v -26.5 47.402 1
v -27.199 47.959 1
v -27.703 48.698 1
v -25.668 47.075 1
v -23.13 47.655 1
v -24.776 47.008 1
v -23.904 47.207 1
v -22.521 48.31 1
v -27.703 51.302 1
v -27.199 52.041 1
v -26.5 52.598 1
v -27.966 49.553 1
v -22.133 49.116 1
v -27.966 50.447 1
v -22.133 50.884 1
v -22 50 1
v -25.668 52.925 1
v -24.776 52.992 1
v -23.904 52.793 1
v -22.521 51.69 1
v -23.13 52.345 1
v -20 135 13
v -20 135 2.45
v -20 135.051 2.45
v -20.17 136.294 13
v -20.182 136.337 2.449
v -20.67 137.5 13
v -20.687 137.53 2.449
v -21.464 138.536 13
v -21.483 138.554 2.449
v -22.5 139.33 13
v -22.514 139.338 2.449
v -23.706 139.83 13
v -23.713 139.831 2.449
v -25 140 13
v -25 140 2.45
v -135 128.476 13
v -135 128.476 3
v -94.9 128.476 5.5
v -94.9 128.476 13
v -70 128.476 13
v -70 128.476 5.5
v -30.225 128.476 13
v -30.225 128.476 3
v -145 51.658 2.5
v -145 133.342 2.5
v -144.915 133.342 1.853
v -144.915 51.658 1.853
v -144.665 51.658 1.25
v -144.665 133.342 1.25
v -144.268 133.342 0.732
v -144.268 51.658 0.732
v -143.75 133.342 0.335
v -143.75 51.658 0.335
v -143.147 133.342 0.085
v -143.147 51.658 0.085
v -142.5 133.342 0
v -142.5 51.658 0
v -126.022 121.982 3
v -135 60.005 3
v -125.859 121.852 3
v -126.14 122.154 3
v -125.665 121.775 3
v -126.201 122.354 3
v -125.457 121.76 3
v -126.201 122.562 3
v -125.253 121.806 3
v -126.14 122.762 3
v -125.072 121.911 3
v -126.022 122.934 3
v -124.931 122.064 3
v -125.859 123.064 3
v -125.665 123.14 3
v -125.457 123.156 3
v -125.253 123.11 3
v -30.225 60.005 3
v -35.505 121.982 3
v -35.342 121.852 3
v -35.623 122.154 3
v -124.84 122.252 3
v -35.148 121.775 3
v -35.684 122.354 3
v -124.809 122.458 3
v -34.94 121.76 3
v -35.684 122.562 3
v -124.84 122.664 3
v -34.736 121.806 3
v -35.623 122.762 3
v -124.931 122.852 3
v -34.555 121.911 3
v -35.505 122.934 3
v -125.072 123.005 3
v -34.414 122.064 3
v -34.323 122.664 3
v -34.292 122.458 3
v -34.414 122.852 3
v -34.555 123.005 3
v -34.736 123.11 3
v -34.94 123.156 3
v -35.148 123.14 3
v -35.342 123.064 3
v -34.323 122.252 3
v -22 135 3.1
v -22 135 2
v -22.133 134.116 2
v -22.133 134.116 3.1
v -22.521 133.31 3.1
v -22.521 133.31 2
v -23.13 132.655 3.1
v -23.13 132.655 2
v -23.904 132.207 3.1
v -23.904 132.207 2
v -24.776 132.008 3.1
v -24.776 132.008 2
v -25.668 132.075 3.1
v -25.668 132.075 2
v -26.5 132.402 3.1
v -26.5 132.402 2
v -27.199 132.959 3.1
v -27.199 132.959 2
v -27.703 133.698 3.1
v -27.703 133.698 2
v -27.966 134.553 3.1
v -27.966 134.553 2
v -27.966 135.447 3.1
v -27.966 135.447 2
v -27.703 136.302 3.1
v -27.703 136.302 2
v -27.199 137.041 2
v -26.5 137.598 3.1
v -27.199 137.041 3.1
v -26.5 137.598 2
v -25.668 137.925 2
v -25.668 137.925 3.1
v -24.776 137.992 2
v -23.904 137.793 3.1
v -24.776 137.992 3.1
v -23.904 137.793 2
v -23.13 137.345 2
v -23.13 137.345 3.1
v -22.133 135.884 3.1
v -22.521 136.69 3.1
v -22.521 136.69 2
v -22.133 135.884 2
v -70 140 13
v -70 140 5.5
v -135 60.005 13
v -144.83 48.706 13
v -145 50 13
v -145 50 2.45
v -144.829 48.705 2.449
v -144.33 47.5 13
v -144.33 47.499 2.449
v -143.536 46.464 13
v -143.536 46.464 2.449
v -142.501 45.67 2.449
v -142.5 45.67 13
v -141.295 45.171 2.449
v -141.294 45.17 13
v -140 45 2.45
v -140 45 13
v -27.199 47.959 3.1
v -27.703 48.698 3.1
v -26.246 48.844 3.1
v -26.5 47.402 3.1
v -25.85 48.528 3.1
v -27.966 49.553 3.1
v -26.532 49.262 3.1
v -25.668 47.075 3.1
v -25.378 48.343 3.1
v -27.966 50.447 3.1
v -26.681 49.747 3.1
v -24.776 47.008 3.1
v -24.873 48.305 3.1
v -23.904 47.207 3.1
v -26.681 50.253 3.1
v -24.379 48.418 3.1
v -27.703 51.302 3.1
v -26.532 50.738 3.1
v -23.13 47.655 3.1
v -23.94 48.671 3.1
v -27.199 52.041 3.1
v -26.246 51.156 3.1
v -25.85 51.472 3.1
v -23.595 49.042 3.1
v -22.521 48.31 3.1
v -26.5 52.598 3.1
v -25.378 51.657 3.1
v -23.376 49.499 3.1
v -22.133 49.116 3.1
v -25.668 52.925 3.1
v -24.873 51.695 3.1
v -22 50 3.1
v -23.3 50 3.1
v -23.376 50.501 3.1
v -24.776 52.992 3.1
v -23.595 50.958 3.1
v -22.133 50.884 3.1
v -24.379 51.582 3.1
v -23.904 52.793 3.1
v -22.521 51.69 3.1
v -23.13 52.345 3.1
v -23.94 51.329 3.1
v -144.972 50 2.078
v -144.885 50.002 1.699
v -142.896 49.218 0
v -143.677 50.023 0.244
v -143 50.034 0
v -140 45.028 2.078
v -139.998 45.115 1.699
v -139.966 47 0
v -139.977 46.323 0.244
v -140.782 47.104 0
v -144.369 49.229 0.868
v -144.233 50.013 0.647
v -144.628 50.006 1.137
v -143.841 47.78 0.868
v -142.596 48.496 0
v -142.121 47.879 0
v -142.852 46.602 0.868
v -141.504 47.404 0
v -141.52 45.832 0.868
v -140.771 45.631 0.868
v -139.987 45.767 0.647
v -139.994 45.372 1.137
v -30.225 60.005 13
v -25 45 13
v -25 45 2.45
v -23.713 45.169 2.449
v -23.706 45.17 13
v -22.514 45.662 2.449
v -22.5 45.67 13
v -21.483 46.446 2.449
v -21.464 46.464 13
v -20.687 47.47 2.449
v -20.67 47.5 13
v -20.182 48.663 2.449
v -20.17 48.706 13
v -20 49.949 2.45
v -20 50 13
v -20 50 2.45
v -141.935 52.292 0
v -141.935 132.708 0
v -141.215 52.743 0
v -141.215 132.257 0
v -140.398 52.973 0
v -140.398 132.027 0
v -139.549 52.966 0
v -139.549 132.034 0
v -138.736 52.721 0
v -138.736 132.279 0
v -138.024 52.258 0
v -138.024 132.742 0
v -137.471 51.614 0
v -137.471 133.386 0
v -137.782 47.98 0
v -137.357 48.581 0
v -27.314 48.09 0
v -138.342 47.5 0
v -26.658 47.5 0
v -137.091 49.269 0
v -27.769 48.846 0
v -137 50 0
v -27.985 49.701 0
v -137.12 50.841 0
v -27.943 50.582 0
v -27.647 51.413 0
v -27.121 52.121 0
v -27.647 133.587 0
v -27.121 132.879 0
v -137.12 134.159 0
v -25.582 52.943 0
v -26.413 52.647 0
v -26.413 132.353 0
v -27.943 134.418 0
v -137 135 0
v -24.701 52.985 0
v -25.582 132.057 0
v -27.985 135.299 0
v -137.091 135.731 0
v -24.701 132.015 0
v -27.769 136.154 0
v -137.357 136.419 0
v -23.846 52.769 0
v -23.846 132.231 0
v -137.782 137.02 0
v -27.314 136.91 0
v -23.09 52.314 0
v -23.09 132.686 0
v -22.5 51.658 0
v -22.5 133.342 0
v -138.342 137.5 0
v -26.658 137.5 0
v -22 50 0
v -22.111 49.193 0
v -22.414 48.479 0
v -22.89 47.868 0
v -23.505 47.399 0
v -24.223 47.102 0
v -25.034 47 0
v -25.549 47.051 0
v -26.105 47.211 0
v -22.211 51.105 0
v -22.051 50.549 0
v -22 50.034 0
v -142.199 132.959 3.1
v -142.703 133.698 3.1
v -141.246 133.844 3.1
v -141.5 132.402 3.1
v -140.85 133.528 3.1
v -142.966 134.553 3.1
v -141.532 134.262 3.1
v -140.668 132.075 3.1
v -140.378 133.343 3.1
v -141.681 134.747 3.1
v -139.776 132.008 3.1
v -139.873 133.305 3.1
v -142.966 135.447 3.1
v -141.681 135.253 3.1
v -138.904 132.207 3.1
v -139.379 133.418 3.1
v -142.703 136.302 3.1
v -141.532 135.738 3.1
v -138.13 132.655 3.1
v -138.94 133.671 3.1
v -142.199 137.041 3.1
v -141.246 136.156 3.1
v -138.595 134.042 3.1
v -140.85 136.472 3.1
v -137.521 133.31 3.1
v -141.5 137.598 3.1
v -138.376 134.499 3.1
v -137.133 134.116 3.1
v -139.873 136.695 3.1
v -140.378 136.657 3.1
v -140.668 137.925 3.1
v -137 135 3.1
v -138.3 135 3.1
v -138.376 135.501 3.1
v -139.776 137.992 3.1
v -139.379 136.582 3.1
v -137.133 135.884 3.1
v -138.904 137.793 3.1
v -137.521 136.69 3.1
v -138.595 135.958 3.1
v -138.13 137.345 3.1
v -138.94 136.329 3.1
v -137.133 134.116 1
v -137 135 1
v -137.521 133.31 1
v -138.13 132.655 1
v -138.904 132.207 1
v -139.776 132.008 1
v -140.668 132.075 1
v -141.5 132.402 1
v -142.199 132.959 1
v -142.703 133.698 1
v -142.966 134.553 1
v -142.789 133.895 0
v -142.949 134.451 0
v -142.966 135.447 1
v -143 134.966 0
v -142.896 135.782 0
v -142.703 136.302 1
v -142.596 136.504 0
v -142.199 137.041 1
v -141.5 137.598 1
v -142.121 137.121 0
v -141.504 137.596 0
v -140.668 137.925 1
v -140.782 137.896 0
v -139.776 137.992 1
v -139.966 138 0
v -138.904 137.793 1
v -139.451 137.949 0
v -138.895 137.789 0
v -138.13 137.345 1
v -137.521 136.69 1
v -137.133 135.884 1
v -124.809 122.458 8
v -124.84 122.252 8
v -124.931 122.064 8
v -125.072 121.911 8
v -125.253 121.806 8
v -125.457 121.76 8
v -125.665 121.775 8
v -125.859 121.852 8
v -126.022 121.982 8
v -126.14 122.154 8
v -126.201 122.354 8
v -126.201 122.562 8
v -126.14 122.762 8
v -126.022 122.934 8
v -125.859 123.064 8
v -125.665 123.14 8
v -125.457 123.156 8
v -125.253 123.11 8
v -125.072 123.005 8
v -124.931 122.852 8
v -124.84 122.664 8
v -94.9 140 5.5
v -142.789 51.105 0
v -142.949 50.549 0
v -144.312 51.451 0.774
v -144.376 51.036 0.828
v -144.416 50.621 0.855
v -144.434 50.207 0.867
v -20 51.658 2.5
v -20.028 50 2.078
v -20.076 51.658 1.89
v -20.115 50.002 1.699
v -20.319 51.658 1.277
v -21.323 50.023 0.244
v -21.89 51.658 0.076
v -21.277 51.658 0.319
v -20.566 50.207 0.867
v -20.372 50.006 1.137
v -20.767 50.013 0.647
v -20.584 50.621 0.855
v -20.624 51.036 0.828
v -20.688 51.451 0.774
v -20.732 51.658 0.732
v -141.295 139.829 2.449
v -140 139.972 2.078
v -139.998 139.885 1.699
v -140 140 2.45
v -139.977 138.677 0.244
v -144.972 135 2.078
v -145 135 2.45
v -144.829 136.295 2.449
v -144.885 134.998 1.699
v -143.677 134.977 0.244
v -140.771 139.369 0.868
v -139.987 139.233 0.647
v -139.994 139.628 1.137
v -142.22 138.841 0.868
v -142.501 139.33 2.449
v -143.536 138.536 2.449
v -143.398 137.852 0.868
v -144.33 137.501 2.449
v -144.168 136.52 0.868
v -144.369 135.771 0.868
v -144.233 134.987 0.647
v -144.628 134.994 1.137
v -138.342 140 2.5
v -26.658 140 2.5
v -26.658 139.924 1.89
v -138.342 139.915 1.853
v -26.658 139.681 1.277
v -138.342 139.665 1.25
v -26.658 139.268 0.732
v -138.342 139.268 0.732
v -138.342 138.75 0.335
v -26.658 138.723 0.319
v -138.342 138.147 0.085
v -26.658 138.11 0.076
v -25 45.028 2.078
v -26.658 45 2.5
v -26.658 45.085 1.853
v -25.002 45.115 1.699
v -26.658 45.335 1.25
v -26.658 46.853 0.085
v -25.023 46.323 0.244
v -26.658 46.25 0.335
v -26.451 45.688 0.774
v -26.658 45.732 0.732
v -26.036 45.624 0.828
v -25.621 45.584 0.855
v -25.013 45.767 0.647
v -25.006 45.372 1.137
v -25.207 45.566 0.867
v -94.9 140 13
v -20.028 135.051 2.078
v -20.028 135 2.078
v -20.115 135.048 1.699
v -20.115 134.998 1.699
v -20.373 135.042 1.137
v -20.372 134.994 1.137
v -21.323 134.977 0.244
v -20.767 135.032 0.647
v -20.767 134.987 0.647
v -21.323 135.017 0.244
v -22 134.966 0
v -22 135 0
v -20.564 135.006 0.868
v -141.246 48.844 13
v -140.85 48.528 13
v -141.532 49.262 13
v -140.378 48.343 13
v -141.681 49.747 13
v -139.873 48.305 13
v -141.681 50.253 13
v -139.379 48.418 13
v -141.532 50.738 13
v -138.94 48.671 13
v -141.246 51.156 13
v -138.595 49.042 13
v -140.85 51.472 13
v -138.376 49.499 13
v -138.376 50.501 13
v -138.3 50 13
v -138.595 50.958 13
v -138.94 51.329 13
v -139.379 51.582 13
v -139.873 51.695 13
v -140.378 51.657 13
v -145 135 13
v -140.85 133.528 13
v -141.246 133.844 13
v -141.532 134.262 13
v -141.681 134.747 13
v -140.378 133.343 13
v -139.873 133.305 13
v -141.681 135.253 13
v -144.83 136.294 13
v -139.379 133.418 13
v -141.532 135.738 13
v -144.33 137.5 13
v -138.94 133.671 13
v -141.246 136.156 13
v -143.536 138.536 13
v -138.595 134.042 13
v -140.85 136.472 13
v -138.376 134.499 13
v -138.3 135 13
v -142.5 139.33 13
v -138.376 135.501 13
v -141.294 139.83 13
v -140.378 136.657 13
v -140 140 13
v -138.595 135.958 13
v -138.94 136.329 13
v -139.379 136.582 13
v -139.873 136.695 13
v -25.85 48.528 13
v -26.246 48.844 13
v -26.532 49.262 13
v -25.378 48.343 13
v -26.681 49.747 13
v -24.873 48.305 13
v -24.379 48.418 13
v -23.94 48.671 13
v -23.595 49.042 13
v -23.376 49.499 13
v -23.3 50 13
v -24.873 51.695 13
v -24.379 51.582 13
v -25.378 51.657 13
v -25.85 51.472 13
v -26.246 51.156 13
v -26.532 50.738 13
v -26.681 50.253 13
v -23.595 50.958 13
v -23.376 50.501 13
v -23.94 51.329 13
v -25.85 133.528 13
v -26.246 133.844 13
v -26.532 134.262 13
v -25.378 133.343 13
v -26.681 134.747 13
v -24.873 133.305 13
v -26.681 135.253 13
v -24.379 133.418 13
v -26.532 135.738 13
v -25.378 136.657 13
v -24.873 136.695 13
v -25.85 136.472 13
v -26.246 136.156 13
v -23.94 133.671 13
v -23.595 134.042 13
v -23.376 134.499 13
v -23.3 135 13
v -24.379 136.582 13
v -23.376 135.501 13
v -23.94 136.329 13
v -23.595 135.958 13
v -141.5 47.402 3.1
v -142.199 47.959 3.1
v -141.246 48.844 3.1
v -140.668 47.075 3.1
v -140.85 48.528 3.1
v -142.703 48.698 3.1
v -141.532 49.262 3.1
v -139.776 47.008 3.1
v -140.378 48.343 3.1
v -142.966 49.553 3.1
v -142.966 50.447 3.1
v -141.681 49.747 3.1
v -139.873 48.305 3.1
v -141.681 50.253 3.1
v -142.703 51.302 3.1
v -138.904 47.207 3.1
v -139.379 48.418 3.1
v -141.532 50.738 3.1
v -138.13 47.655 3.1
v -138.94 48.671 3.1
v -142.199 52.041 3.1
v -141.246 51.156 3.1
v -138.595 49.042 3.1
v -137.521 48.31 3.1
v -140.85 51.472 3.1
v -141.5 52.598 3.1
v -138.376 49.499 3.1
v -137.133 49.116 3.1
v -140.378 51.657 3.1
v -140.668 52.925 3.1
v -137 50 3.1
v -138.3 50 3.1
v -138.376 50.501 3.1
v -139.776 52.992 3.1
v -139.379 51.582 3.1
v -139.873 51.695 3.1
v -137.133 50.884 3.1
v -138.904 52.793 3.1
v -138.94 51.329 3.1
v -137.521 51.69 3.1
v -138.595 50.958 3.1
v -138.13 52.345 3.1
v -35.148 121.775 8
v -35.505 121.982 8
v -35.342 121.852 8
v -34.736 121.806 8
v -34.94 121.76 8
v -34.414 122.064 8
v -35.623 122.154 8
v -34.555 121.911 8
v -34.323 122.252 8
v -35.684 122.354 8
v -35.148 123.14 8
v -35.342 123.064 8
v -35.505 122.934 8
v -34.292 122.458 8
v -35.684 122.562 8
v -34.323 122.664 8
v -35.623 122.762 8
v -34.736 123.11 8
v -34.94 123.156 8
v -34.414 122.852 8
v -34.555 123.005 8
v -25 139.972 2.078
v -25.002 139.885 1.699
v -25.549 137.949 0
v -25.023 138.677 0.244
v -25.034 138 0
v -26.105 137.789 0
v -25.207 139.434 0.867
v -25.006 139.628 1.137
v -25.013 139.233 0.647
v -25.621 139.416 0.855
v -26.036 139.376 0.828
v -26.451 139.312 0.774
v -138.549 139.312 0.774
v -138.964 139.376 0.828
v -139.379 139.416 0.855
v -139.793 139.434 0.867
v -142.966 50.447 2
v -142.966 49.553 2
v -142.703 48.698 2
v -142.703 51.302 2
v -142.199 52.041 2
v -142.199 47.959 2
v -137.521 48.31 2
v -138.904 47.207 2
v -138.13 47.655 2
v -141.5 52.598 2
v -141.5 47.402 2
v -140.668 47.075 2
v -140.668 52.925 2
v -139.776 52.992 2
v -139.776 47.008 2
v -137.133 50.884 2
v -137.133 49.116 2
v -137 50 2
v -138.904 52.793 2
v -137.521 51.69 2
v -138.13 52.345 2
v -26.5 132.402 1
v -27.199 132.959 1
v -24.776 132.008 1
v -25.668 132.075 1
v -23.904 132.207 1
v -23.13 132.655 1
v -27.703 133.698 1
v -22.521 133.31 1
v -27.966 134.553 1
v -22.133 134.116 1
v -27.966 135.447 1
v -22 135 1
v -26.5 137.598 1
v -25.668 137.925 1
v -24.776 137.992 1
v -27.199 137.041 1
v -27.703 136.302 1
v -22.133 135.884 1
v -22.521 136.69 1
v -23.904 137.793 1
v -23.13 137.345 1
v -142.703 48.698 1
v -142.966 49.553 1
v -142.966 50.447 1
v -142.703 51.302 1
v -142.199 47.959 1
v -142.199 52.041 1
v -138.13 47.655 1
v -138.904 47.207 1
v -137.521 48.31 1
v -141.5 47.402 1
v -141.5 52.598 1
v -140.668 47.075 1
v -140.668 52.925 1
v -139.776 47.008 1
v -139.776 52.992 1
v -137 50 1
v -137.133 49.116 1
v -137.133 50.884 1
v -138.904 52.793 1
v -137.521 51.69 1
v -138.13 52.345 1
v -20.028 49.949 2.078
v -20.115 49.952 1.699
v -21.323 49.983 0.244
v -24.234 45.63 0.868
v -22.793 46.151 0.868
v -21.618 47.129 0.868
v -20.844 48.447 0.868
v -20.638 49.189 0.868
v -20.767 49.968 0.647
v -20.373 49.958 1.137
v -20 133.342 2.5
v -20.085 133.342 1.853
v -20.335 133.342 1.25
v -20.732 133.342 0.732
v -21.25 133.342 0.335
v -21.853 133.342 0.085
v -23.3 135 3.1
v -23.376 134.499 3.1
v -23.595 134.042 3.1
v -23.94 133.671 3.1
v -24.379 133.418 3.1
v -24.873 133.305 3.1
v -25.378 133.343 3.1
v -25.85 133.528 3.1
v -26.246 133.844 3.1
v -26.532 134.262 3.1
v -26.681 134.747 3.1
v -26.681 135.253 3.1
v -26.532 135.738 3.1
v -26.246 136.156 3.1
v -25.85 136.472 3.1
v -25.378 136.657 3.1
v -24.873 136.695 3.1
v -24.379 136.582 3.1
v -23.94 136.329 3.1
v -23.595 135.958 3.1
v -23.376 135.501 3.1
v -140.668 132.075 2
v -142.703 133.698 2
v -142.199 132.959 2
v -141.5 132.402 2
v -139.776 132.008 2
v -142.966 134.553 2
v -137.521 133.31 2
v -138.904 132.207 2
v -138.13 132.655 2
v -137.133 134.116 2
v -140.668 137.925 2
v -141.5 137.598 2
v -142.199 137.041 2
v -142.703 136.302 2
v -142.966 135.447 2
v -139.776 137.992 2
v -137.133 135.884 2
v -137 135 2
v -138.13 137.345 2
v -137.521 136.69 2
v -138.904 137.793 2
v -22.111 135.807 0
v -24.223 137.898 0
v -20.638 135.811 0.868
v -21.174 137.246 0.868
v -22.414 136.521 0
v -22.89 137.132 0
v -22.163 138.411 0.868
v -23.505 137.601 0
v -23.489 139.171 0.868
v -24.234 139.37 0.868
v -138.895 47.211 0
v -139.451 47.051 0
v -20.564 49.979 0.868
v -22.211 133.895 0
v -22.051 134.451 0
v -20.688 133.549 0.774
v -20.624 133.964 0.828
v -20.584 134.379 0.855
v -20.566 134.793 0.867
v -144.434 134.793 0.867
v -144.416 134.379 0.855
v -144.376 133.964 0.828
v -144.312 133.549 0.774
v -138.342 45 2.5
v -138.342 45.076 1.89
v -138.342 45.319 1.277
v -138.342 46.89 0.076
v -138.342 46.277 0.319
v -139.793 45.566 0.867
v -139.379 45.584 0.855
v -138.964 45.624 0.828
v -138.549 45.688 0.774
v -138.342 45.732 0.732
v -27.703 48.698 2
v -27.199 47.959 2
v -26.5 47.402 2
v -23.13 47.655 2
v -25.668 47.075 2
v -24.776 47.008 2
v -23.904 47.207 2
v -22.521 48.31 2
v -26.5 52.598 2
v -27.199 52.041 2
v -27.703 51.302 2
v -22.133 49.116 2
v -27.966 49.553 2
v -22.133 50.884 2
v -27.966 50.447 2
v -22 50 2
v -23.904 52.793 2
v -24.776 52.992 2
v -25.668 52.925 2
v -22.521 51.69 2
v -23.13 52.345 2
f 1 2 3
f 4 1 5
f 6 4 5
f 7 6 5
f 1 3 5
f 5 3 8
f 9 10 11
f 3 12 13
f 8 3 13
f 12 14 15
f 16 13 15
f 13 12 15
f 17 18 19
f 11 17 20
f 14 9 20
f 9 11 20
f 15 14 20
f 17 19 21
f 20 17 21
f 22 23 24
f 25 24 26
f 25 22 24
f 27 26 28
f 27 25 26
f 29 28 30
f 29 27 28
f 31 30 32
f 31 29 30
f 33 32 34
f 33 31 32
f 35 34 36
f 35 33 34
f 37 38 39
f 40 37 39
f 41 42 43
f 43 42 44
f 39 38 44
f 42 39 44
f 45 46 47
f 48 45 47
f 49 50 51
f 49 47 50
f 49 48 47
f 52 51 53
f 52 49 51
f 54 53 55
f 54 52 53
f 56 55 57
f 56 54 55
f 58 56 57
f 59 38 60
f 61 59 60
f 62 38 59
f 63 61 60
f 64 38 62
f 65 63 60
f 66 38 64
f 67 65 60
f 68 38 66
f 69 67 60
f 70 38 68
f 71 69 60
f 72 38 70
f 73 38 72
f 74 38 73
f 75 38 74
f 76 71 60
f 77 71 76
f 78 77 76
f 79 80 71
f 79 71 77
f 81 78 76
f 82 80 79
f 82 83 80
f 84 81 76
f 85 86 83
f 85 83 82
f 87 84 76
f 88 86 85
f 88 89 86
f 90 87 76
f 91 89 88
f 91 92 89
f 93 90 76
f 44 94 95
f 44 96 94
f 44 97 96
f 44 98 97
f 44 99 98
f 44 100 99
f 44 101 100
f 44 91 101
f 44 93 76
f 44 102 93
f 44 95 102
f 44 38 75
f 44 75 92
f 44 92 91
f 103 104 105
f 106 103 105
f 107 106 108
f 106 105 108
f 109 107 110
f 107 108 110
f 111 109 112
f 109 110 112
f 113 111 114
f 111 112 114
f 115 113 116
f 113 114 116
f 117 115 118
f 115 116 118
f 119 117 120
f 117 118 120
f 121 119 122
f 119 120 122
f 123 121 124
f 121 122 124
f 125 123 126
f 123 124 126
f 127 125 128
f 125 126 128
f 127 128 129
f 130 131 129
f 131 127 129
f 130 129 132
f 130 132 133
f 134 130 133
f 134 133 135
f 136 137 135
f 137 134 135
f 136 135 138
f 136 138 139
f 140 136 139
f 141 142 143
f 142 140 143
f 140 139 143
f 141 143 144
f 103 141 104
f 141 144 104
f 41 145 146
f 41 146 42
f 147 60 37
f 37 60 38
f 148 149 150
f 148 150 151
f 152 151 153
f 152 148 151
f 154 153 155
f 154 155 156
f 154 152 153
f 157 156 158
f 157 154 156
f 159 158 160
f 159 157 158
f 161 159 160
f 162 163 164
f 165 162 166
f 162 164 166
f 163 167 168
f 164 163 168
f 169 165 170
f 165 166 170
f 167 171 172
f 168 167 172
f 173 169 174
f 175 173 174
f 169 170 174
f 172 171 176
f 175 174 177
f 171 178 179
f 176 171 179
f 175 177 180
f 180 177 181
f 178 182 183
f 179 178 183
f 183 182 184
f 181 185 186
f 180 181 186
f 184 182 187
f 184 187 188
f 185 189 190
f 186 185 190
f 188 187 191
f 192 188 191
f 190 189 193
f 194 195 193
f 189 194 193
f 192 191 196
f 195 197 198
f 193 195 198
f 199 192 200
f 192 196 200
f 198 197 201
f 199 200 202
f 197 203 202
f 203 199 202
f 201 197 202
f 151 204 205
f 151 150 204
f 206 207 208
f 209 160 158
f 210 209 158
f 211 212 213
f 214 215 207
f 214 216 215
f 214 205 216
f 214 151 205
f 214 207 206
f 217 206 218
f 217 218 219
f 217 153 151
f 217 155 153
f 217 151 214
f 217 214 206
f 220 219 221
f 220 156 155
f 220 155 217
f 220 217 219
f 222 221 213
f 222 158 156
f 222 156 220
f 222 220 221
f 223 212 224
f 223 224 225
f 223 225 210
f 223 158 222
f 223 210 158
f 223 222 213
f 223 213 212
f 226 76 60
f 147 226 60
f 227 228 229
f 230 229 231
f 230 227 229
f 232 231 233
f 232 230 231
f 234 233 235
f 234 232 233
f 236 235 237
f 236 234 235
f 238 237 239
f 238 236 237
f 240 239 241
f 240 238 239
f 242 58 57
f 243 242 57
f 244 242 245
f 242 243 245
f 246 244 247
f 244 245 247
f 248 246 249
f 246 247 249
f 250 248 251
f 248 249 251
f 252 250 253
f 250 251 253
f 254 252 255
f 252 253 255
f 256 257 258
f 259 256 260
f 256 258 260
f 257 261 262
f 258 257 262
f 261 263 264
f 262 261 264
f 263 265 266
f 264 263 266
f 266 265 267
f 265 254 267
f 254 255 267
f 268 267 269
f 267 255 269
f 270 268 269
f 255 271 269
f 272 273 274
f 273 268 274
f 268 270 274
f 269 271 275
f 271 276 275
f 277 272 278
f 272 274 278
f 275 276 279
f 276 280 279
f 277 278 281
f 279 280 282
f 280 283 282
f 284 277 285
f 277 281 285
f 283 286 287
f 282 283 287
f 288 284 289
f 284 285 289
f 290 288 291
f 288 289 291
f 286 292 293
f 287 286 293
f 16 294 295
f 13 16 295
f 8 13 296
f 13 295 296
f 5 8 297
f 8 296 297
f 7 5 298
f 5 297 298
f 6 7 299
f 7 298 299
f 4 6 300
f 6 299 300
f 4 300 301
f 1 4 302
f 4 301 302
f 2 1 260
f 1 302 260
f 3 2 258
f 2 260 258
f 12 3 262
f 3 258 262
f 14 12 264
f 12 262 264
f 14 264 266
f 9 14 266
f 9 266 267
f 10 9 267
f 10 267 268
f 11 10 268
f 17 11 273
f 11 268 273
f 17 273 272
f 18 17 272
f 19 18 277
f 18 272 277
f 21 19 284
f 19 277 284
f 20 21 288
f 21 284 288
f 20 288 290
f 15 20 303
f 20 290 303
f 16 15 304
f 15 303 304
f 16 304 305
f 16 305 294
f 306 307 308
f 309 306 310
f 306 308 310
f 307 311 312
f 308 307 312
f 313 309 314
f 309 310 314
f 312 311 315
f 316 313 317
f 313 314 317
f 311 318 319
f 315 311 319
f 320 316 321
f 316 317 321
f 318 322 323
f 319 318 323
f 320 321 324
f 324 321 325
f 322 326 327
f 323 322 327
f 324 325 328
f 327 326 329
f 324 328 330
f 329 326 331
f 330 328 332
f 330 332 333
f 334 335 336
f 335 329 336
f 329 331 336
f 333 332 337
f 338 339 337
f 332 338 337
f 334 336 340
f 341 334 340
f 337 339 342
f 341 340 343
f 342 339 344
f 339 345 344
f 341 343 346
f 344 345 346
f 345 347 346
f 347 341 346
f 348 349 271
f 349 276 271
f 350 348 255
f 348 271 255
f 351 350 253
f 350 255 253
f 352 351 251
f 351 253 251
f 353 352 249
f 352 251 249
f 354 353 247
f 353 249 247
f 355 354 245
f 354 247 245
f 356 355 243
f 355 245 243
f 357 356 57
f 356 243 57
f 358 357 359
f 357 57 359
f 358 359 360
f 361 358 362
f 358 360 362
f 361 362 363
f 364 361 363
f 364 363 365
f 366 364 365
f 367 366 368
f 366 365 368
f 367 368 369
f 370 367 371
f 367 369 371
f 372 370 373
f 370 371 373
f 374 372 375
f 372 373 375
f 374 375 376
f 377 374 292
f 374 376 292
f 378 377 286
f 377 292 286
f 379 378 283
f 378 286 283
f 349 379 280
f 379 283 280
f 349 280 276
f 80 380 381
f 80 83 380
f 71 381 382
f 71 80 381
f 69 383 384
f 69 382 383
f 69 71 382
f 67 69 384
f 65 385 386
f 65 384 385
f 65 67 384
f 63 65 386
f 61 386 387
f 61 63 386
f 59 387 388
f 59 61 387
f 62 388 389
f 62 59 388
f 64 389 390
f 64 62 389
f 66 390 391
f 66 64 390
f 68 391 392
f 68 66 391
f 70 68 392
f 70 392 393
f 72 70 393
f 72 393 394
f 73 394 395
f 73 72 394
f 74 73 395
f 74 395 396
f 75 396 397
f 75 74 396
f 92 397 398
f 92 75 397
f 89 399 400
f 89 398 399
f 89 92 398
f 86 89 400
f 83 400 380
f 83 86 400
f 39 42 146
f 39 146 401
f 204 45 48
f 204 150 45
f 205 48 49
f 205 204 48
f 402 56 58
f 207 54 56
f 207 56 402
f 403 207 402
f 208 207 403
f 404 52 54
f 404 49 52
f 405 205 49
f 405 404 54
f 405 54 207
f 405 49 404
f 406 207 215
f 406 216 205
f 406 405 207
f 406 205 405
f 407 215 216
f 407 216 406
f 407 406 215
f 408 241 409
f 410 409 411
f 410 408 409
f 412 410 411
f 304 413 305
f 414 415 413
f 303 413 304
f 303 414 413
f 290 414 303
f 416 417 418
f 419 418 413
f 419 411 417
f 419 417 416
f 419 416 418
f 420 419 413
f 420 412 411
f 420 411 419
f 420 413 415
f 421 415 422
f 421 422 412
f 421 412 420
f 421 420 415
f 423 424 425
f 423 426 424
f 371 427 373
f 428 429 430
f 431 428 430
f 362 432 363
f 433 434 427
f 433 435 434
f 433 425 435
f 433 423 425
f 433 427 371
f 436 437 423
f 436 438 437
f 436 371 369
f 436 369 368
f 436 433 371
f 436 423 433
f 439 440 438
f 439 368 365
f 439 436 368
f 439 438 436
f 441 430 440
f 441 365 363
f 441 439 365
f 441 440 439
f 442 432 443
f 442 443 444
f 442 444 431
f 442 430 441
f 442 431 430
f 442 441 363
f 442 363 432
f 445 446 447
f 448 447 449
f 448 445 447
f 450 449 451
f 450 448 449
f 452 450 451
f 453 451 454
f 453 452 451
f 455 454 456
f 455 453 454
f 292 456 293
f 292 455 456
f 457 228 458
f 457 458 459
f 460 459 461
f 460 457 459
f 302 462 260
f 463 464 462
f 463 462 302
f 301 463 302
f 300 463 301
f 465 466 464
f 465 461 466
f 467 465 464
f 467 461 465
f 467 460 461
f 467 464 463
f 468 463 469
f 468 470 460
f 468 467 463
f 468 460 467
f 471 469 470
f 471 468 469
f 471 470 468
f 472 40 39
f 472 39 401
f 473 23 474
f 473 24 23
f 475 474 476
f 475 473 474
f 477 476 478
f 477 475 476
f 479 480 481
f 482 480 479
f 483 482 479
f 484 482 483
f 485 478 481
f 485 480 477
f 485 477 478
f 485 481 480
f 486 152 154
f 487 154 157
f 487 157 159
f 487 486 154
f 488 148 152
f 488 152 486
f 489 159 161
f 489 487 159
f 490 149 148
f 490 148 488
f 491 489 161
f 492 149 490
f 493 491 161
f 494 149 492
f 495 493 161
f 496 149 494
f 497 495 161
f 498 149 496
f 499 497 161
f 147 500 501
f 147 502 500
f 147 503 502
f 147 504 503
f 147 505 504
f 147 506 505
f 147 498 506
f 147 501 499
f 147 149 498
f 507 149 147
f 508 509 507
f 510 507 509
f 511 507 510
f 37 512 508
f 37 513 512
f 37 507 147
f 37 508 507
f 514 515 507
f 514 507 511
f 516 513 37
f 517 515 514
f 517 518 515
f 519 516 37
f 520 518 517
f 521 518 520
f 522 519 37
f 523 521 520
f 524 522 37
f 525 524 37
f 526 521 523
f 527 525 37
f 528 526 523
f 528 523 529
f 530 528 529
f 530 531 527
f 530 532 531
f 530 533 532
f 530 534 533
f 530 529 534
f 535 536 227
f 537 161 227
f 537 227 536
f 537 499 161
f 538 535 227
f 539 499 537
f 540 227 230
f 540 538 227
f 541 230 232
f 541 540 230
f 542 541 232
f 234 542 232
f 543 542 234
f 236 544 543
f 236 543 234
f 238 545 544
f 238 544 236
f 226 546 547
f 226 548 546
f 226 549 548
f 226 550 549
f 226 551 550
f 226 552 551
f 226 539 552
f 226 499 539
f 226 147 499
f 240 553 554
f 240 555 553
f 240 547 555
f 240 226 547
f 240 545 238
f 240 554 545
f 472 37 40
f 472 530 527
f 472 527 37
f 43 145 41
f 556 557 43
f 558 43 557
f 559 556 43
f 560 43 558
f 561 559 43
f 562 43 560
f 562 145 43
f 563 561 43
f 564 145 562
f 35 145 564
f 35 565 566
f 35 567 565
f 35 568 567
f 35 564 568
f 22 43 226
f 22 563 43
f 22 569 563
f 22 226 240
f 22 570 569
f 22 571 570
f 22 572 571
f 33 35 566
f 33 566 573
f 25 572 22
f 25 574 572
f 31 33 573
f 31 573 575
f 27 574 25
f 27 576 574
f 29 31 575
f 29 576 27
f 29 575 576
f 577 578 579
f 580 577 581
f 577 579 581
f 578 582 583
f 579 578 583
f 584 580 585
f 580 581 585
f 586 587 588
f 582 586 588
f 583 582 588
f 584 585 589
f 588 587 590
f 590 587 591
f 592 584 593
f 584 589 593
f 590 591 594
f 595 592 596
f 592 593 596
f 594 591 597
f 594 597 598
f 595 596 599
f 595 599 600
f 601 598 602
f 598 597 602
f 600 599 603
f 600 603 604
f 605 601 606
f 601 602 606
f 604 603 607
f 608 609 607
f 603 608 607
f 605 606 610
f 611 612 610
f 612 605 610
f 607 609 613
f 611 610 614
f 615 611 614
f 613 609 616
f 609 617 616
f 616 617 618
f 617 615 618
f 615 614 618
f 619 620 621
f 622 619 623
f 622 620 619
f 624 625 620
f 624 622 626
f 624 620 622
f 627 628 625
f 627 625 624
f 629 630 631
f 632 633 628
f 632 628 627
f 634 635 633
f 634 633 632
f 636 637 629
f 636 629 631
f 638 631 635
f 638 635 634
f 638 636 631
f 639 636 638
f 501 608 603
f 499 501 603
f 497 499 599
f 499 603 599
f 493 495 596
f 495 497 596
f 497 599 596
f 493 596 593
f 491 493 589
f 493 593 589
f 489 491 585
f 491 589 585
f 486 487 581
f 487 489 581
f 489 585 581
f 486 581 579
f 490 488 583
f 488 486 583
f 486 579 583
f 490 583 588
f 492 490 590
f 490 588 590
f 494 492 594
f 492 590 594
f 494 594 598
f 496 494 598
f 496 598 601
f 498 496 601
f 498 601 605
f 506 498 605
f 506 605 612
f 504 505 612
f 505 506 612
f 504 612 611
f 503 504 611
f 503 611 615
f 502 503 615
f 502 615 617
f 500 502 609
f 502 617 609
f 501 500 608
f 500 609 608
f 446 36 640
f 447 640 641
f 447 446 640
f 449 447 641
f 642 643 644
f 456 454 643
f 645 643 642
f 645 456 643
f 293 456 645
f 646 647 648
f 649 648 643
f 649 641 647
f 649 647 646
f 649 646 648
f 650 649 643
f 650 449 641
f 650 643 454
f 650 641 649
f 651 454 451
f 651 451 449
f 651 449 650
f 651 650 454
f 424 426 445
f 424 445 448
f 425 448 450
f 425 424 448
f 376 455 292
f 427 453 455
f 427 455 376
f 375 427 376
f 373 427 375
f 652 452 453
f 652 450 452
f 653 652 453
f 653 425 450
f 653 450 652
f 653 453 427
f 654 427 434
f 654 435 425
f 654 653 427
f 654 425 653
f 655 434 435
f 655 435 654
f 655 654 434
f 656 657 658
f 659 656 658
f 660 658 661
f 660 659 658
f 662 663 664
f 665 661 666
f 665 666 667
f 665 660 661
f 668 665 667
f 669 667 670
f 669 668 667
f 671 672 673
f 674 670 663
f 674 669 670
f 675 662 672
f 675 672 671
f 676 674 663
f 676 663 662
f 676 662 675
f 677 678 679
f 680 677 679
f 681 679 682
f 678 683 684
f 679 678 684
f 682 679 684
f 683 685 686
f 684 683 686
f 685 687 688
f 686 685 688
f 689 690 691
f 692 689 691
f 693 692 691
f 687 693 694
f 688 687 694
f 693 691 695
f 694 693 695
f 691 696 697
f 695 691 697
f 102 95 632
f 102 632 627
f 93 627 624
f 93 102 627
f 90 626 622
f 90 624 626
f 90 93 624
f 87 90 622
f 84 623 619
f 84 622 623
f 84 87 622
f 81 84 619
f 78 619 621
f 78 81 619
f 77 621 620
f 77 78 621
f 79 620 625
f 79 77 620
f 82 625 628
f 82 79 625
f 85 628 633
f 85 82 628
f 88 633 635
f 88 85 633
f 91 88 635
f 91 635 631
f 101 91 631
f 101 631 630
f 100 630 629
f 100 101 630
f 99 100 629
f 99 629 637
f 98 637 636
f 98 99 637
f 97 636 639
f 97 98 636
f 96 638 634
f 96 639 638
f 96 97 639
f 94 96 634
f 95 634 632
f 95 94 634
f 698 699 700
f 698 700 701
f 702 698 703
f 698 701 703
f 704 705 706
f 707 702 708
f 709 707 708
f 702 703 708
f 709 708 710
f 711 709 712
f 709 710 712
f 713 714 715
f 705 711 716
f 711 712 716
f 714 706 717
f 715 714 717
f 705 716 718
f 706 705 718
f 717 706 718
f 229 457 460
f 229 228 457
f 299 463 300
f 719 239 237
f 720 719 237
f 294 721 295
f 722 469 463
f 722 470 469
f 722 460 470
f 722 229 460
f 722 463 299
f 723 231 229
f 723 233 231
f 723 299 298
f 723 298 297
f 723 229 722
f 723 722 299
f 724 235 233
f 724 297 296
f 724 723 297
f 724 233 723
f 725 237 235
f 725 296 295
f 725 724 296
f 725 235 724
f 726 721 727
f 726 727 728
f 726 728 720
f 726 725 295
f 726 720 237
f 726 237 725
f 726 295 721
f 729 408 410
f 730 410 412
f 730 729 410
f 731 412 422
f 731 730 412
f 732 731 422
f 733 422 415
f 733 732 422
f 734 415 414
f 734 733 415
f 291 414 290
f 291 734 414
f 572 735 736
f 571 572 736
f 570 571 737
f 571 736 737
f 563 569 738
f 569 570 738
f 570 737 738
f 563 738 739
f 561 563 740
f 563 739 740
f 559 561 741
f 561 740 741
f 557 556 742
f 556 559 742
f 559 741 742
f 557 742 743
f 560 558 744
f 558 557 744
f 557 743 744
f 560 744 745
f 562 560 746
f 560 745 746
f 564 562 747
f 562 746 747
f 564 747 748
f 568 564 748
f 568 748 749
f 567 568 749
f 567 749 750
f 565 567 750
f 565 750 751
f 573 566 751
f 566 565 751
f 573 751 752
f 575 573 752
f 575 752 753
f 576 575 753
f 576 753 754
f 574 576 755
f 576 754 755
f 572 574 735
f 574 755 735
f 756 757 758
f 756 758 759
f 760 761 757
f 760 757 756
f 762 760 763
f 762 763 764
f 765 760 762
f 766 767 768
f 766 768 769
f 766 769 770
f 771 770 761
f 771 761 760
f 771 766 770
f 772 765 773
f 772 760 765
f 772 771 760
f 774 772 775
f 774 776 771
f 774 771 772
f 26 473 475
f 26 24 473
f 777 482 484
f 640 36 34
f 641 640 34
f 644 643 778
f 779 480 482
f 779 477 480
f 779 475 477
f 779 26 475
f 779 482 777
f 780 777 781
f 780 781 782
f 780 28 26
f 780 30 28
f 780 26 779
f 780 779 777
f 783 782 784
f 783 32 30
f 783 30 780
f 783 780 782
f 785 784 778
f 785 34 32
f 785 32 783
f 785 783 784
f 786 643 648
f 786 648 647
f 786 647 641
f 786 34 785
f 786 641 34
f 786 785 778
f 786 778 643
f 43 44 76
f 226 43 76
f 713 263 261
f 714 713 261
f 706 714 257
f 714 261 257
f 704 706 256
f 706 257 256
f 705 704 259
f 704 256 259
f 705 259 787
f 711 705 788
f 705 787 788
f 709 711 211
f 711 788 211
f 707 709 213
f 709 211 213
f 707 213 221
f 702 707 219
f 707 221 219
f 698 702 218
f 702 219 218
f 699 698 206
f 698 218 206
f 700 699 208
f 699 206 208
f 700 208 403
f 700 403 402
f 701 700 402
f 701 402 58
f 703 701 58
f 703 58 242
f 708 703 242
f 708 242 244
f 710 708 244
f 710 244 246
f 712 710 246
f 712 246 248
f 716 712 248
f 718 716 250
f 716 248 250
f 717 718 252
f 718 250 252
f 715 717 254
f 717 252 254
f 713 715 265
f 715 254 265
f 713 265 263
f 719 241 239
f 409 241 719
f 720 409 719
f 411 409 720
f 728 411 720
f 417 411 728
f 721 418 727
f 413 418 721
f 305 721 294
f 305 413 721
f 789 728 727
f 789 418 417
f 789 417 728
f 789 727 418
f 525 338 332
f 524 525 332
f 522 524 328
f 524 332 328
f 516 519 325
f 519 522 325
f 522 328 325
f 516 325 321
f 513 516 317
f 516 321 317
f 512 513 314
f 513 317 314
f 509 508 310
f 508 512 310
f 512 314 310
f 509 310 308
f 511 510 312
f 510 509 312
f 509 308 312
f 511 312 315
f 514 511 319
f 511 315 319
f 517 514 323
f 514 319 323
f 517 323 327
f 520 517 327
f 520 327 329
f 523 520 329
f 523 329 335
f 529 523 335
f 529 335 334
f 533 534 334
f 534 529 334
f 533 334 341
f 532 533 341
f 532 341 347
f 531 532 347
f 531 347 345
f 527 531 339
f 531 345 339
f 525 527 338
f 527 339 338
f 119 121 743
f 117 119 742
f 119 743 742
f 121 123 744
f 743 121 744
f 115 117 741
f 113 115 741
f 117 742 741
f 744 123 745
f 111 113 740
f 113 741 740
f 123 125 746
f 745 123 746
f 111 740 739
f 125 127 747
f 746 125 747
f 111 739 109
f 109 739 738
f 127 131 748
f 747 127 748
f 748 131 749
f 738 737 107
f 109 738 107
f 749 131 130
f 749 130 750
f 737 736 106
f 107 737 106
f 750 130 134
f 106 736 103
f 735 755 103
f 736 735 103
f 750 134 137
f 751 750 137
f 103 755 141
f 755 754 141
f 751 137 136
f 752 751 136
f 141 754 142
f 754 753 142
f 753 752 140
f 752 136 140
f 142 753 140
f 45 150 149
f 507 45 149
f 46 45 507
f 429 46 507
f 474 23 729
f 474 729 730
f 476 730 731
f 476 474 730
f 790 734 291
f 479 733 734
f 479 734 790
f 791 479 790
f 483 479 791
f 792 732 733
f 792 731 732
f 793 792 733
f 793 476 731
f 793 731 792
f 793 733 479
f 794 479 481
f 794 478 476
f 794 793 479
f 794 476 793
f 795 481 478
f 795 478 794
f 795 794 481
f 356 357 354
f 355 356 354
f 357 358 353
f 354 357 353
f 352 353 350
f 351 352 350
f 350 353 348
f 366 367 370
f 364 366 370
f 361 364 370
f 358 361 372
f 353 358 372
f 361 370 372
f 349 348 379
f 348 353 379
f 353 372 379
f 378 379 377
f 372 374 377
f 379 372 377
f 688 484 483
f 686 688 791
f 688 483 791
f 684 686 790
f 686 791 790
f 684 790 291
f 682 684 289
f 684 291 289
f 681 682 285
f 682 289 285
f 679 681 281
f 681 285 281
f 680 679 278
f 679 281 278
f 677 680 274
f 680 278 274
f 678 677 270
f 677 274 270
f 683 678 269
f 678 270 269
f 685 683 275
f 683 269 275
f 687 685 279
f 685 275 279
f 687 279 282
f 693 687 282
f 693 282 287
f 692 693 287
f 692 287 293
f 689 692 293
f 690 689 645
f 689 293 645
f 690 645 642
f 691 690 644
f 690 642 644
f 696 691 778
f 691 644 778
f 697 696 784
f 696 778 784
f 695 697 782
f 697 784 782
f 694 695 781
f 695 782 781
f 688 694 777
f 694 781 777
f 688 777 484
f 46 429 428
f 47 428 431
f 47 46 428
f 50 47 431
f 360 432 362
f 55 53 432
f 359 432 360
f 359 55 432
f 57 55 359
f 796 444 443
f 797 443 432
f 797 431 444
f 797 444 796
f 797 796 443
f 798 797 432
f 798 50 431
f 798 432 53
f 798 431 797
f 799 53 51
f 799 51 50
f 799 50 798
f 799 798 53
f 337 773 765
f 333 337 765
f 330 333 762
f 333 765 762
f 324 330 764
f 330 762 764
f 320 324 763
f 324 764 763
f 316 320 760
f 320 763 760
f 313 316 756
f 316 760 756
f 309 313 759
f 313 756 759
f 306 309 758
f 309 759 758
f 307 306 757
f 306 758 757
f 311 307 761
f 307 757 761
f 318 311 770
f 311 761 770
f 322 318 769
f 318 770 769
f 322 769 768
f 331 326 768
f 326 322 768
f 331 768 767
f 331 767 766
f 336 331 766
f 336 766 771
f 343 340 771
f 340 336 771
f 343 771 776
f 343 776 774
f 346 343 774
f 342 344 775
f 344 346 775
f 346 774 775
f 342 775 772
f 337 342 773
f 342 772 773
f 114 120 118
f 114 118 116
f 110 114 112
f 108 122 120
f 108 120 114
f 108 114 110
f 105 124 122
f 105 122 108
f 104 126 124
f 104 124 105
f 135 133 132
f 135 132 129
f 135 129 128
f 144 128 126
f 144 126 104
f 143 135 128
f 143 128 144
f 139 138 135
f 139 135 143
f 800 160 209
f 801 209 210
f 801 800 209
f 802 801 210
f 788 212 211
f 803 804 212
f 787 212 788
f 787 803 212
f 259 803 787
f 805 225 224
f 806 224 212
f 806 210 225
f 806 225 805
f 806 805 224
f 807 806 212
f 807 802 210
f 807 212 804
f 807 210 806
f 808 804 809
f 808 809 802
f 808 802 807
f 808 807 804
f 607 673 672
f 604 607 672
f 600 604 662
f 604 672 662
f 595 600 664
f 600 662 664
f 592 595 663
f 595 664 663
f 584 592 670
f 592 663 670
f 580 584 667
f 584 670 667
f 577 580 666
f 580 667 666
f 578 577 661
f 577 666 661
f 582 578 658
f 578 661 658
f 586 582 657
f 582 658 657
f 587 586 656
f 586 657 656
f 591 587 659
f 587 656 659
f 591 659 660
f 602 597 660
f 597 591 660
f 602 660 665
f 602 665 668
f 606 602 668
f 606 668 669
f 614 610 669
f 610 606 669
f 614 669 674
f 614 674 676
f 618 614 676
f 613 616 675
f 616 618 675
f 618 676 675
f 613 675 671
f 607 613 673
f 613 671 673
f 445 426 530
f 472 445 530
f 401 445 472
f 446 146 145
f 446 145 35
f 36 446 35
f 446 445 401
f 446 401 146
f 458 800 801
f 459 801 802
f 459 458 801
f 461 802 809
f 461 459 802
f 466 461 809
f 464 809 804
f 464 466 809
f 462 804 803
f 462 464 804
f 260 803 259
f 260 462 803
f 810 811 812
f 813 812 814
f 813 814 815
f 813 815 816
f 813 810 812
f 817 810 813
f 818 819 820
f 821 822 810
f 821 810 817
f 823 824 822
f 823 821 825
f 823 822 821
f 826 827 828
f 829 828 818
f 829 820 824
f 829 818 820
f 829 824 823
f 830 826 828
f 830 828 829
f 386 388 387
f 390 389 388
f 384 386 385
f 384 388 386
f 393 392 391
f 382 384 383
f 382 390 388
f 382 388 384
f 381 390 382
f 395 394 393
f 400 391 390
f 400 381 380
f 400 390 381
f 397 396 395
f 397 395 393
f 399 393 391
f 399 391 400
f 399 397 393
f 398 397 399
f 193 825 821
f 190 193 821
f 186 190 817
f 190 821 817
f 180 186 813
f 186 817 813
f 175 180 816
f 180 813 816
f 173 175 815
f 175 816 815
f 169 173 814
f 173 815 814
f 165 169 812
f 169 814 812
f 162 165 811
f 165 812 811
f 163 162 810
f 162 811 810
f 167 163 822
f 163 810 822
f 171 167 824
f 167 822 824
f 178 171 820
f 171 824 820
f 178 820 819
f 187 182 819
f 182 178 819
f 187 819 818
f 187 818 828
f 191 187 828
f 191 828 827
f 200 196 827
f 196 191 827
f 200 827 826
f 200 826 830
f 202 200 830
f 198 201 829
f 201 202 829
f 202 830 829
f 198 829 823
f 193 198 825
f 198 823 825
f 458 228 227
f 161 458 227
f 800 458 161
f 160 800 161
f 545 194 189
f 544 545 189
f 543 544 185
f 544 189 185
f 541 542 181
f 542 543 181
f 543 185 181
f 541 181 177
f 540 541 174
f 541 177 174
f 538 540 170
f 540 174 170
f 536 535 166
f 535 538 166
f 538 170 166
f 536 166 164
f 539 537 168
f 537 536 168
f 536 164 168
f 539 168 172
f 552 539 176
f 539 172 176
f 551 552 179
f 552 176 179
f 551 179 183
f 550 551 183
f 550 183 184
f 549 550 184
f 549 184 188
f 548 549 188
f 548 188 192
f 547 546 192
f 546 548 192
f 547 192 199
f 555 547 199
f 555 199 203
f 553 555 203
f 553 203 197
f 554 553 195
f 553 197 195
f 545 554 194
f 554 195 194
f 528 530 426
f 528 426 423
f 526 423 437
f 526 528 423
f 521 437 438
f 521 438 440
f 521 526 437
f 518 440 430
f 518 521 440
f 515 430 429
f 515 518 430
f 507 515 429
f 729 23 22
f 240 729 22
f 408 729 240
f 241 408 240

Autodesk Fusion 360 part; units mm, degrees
sketch "Sketch1" plane through (0, 0, 0) normal (0, 0, 1) x (1, 0, 0)
  line L0 (-135, 128.4755) -> (-30.225, 128.4755)
  line L1 (-30.225, 128.4755) -> (-30.225, 60.0051)
  line L2 (-30.225, 60.0051) -> (-135, 60.0051)
  line L3 (-135, 60.0051) -> (-135, 128.4755)
  circle A0 centre (-34.9919, 122.4579) radius 0.7
  circle A1 centre (-125.5089, 122.4579) radius 0.7
  circle A2 centre (-140, 135) radius 3
  circle A3 centre (-25, 135) radius 3
  circle A4 centre (-25, 50) radius 3
  circle A5 centre (-140, 50) radius 3
  line L4 (-145, 140) -> (-20, 140)
  line L5 (-20, 140) -> (-20, 45)
  line L6 (-20, 45) -> (-145, 45)
  line L7 (-145, 45) -> (-145, 140)
  circle A6 centre (-25, 135) radius 1.7
  circle A7 centre (-140, 135) radius 1.7
  circle A8 centre (-140, 50) radius 1.7
  circle A9 centre (-25, 50) radius 1.7
  dimension "d1" = 104.775
  dimension "d2" = 68.4704
  dimension "d17" = 1.4
  dimension "d18" = 1.4
  dimension "d24" = 6
  dimension "d25" = 6
  dimension "d26" = 6
  dimension "d28" = 6
  dimension "d29" = 3.4
  dimension "d30" = 3.4
  dimension "d31" = 3.4
  dimension "d32" = 3.4
extrude "Extrude1" add sketch "Sketch1" along normal blind 9.9 from surface at 3.1 contours A2 | A3 | A4 | A5 makes body 1 at (-22.2356, 136.1653, 9.7) makes body 2 at (-137.2356, 136.1653, 9.7) makes body 3 at (-22.0037, 49.8505, 9.7) makes body 4 at (-139.1875, 52.8879, 9.7)
extrude "Extrude2" add sketch "Sketch1" along normal blind 13 contours L4 L5 L6 L7 bodies 1 2 3 4
extrude "Extrude3" add sketch "Sketch1" along normal blind 3 contours L0 L1 L2 L3 bodies 1
extrude "Extrude4" add sketch "Sketch1" along normal blind 8 contours A0 | A1 bodies 1
sketch "Sketch2" plane through (0, 0, 13) normal (0, 0, 1) x (-1, 0, 0)
  circle A0 centre (25, -135) radius 1.7
  circle A1 centre (140, -50) radius 1.7
  line L0 (30.225, -60.0051) -> (135, -60.0051)
  line L1 (135, -60.0051) -> (135, -128.4755)
  line L2 (135, -128.4755) -> (30.225, -128.4755)
  line L3 (30.225, -128.4755) -> (30.225, -60.0051)
  line L4 (145, -45) -> (20, -45)
  line L5 (20, -45) -> (20, -140)
  line L6 (20, -140) -> (145, -140)
  line L7 (145, -140) -> (145, -45)
  circle A2 centre (140, -135) radius 1.7
  circle A3 centre (25, -50) radius 1.7
  line L8 (94.9004, -128.4755) -> (94.9004, -140)
  line L9 (70, -140) -> (70, -128.4755)
extrude "Extrude5" cut sketch "Sketch2" against normal blind 7.5 contours L2 L6 L8 L9 bodies 1
fillet "Fillet1" radius 5 4 edges at (-145, 45, 6.5) (-145, 140, 6.5) (-20, 140, 6.5) (-20, 45, 6.5) on bodies 1
fillet "Fillet2" radius 2.5 8 edges at (-143.5355, 138.5355, 0) (-82.5, 140, 0) (-21.4645, 138.5355, 0) (-20, 92.5, 0) (-21.4645, 46.4645, 0) (-82.5, 45, 0) (-143.5355, 46.4645, 0) (-145, 92.5, 0) on bodies 1
extrude "Extrude6" add sketch "Sketch1" along normal blind 2 contours A2 | A3 | A4 | A5 | A6 | A7 | A8 | A9 bodies 1
extrude "Extrude7" cut sketch "Sketch1" along normal blind 1 contours A2 | A3 | A4 | A5 | A6 | A7 | A8 | A9 bodies 1
